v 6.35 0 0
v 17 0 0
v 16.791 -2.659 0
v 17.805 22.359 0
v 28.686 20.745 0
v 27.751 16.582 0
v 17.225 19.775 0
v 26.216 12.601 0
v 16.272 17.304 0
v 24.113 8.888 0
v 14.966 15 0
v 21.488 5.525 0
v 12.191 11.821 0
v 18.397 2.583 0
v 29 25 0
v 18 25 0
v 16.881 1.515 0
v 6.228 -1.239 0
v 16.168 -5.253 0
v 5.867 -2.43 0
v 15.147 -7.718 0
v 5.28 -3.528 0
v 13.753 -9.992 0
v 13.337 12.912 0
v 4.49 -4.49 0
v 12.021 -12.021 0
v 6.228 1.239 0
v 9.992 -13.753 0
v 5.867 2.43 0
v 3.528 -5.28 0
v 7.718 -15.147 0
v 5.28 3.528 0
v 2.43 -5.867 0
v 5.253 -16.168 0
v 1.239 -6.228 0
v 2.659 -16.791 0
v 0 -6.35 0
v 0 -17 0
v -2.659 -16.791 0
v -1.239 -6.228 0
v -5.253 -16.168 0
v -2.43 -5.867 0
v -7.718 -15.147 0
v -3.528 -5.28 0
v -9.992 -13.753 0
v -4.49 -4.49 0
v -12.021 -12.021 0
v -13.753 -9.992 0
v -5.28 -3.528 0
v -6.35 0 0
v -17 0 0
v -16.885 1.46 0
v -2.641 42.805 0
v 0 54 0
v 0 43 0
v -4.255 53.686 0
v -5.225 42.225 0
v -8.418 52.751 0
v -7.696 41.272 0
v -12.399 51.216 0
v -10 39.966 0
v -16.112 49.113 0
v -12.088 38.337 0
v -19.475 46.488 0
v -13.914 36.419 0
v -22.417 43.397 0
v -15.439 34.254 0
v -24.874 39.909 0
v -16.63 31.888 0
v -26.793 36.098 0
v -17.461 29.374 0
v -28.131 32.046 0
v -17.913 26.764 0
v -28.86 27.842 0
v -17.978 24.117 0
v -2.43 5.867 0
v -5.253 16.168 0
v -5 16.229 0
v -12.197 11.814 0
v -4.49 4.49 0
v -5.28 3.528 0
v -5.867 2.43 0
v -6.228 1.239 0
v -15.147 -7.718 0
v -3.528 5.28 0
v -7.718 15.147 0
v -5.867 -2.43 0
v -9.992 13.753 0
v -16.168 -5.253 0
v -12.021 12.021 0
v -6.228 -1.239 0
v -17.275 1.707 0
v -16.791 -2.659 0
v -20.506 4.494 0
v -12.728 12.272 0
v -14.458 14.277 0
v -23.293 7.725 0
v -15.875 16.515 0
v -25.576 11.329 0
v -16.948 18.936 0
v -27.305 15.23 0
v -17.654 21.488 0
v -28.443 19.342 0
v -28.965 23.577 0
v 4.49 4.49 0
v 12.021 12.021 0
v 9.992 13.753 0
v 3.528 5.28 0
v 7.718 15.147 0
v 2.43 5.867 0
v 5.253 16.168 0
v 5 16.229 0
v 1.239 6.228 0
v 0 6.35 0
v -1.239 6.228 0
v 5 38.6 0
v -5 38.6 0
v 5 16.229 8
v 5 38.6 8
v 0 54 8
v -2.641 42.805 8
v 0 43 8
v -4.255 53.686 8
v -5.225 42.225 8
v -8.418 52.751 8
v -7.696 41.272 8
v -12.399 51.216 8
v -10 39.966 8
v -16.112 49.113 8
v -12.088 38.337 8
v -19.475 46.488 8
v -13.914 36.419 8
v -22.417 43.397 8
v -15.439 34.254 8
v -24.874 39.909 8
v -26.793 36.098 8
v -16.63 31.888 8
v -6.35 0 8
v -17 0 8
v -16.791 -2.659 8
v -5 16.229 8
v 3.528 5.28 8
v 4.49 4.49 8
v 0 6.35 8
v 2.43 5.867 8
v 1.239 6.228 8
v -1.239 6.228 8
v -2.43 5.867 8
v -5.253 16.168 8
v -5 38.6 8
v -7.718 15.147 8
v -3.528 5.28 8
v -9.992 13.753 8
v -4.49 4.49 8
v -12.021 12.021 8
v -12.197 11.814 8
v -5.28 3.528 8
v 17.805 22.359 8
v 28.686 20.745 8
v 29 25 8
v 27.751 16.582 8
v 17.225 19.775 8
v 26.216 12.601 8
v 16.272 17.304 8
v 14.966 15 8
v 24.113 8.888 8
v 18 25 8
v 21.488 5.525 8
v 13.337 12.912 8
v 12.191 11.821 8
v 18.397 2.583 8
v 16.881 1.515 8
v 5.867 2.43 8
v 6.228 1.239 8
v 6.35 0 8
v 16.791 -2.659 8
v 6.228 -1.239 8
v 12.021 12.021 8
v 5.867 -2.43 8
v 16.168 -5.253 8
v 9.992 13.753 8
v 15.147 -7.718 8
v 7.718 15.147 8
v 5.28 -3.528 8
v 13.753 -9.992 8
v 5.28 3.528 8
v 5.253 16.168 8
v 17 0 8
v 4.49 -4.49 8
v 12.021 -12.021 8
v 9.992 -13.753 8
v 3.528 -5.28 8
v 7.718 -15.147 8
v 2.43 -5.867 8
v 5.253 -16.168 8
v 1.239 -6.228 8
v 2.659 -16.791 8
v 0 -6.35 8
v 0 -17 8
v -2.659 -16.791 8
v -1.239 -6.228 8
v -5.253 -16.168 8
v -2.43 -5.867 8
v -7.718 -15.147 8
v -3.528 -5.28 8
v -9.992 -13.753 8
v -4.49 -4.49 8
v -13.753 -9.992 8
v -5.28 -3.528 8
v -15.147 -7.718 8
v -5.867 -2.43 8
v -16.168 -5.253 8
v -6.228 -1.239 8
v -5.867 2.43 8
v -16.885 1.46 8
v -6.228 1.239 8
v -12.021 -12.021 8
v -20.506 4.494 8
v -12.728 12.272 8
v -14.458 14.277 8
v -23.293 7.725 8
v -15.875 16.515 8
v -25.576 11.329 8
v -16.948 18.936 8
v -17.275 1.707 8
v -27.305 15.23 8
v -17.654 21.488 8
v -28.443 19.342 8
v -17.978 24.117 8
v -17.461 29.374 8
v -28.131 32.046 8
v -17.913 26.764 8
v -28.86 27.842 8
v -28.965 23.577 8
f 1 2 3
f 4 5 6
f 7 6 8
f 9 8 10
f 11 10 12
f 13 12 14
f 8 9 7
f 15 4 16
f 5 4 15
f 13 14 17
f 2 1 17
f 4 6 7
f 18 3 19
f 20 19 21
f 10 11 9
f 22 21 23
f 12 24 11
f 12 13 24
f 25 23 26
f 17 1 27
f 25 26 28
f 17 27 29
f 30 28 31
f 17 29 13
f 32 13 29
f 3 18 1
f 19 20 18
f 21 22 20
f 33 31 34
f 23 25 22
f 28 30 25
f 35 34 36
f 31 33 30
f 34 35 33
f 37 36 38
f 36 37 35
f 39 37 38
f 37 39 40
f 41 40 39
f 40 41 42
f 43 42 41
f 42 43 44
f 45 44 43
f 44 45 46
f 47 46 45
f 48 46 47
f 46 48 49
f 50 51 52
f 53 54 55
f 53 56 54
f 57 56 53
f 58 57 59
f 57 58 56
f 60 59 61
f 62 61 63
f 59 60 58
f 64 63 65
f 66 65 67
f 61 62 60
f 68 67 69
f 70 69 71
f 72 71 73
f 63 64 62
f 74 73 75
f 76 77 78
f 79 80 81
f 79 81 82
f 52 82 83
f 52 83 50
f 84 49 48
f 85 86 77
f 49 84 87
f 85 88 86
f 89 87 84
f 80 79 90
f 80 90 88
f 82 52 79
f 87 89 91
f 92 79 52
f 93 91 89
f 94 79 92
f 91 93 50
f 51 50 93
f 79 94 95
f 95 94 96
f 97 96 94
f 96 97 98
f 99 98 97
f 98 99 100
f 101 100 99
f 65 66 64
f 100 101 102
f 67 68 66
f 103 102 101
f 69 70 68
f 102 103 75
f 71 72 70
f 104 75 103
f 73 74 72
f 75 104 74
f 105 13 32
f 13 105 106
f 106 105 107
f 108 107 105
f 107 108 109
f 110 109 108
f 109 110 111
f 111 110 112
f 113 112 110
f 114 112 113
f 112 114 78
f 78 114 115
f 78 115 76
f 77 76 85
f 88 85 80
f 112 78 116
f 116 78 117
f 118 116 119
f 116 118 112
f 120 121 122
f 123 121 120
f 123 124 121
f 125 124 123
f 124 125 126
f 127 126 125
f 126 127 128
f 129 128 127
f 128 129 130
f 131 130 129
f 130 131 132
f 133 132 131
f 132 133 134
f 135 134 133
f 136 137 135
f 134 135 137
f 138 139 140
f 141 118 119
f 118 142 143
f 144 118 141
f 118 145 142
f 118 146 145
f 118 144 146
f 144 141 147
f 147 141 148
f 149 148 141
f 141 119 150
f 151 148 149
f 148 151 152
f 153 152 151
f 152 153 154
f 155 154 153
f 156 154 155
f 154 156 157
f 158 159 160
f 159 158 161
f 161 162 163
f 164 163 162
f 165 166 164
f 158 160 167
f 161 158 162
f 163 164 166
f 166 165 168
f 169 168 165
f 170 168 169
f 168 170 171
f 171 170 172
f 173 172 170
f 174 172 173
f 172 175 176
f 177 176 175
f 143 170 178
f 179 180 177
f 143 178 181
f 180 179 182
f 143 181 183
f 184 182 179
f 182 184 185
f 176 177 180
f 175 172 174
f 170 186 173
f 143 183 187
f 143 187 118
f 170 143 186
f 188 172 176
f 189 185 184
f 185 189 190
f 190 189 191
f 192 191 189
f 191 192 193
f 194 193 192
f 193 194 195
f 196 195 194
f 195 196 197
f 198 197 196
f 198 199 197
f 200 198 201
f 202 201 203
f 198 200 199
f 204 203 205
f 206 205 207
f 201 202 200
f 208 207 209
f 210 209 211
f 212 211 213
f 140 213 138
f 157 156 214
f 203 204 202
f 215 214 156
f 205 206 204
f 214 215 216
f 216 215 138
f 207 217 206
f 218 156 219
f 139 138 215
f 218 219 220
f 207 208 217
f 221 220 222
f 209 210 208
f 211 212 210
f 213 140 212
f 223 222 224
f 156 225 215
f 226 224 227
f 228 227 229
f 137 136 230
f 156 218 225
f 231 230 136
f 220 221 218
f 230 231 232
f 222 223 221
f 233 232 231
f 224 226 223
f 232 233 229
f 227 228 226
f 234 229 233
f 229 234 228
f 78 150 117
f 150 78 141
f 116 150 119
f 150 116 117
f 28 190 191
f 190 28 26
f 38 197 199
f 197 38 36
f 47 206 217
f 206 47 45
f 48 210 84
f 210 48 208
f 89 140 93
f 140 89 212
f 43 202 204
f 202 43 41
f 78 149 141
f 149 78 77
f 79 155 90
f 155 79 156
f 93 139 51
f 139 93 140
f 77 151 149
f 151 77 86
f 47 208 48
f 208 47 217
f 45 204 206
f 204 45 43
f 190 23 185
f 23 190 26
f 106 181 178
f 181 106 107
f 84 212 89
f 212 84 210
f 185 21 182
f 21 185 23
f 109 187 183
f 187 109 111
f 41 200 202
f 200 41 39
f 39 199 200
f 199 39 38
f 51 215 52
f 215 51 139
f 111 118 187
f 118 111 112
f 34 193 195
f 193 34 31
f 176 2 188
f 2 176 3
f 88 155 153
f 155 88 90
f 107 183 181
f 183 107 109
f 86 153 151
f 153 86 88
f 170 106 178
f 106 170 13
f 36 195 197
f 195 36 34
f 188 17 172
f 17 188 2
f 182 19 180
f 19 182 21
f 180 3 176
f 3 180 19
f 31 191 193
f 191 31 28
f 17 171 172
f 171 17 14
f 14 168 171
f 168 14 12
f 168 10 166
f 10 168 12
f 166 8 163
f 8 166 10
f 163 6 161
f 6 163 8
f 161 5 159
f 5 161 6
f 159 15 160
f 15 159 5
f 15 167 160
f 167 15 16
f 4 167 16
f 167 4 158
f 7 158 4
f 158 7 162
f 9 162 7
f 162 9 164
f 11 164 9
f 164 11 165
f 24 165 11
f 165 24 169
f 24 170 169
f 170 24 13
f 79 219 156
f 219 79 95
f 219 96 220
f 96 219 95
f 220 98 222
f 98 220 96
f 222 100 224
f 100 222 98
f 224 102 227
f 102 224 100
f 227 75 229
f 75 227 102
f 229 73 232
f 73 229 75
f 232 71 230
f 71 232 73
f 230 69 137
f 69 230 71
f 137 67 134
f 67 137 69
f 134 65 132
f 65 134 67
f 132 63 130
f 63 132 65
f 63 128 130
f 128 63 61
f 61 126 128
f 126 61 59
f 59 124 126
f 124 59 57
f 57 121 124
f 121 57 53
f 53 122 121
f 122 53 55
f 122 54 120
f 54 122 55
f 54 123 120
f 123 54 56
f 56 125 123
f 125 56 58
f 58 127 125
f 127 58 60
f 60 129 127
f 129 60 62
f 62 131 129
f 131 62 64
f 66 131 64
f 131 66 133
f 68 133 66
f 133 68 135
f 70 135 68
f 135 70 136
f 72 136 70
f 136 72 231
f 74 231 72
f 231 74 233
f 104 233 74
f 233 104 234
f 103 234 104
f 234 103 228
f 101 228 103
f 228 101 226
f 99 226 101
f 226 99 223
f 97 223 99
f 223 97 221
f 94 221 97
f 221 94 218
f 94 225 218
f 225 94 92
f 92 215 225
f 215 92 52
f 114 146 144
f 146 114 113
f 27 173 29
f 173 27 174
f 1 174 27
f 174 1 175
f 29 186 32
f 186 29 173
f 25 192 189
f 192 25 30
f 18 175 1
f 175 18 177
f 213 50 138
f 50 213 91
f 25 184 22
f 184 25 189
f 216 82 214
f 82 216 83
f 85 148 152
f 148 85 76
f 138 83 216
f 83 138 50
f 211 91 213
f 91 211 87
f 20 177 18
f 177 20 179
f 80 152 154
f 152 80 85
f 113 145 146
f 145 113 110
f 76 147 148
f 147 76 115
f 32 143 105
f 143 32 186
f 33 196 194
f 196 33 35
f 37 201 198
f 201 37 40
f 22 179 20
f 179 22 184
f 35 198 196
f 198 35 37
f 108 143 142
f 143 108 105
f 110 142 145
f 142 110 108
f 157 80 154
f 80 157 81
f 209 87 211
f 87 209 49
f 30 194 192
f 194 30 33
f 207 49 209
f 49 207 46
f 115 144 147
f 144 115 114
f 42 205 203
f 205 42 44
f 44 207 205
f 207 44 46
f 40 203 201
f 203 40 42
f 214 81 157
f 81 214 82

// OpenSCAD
$fn = 32;

// ----------------------------------------------------------------------
// Hook: 50 mm shank into a 18 mm curl, 8 mm thick
// ----------------------------------------------------------------------

// --- parameters (mm) ---
shank_len = 50;           // shank length from the boss centre
shank_w = 10;             // shank width
boss_d = 34;              // boss diameter
bore_d = 12.7;            // boss bore
curl_in = 18;             // curl inner radius
curl_out = 29;            // curl outer radius
curl_sweep = 270;         // curl sweep angle
hook_t = 8;               // hook thickness

shank_profile = [[-5, 38.6], [5, 38.6], [5, 15], [-5, 15]];
boss_profile = [[17, 0], [16.791, 2.659], [16.168, 5.253], [15.147, 7.718], [13.753, 9.992], [12.021, 12.021], [9.992, 13.753], [7.718, 15.147], [5.253, 16.168], [2.659, 16.791], [0, 17], [-2.659, 16.791], [-5.253, 16.168], [-7.718, 15.147], [-9.992, 13.753], [-12.021, 12.021], [-13.753, 9.992], [-15.147, 7.718], [-16.168, 5.253], [-16.791, 2.659], [-17, 0], [-16.791, -2.659], [-16.168, -5.253], [-15.147, -7.718], [-13.753, -9.992], [-12.021, -12.021], [-9.992, -13.753], [-7.718, -15.147], [-5.253, -16.168], [-2.659, -16.791], [0, -17], [2.659, -16.791], [5.253, -16.168], [7.718, -15.147], [9.992, -13.753], [12.021, -12.021], [13.753, -9.992], [15.147, -7.718], [16.168, -5.253], [16.791, -2.659]];
curl_profile = [[0, 54], [-4.255, 53.686], [-8.418, 52.751], [-12.399, 51.216], [-16.112, 49.113], [-19.475, 46.488], [-22.417, 43.397], [-24.874, 39.909], [-26.793, 36.098], [-28.131, 32.046], [-28.86, 27.842], [-28.965, 23.577], [-28.443, 19.342], [-27.305, 15.23], [-25.576, 11.329], [-23.293, 7.725], [-20.506, 4.494], [-17.275, 1.707], [-13.671, -0.576], [-9.77, -2.305], [-5.658, -3.443], [-1.423, -3.965], [2.842, -3.86], [7.046, -3.131], [11.098, -1.793], [14.909, 0.126], [18.397, 2.583], [21.488, 5.525], [24.113, 8.888], [26.216, 12.601], [27.751, 16.582], [28.686, 20.745], [29, 25], [18, 25], [17.805, 22.359], [17.225, 19.775], [16.272, 17.304], [14.966, 15], [13.337, 12.912], [11.419, 11.086], [9.254, 9.561], [6.888, 8.37], [4.374, 7.539], [1.764, 7.087], [-0.883, 7.022], [-3.512, 7.346], [-6.064, 8.052], [-8.485, 9.125], [-10.723, 10.542], [-12.728, 12.272], [-14.458, 14.277], [-15.875, 16.515], [-16.948, 18.936], [-17.654, 21.488], [-17.978, 24.117], [-17.913, 26.764], [-17.461, 29.374], [-16.63, 31.888], [-15.439, 34.254], [-13.914, 36.419], [-12.088, 38.337], [-10, 39.966], [-7.696, 41.272], [-5.225, 42.225], [-2.641, 42.805], [0, 43]];

difference() {
  union() {
    /* three overlapping outlines: shank, boss and the smooth curl */
    linear_extrude(height = hook_t) polygon(shank_profile);
    linear_extrude(height = hook_t) polygon(boss_profile);
    linear_extrude(height = hook_t) polygon(curl_profile);
  }
  translate([0, 0, -2.5]) cylinder(h = hook_t + 5, d = bore_d);
}
